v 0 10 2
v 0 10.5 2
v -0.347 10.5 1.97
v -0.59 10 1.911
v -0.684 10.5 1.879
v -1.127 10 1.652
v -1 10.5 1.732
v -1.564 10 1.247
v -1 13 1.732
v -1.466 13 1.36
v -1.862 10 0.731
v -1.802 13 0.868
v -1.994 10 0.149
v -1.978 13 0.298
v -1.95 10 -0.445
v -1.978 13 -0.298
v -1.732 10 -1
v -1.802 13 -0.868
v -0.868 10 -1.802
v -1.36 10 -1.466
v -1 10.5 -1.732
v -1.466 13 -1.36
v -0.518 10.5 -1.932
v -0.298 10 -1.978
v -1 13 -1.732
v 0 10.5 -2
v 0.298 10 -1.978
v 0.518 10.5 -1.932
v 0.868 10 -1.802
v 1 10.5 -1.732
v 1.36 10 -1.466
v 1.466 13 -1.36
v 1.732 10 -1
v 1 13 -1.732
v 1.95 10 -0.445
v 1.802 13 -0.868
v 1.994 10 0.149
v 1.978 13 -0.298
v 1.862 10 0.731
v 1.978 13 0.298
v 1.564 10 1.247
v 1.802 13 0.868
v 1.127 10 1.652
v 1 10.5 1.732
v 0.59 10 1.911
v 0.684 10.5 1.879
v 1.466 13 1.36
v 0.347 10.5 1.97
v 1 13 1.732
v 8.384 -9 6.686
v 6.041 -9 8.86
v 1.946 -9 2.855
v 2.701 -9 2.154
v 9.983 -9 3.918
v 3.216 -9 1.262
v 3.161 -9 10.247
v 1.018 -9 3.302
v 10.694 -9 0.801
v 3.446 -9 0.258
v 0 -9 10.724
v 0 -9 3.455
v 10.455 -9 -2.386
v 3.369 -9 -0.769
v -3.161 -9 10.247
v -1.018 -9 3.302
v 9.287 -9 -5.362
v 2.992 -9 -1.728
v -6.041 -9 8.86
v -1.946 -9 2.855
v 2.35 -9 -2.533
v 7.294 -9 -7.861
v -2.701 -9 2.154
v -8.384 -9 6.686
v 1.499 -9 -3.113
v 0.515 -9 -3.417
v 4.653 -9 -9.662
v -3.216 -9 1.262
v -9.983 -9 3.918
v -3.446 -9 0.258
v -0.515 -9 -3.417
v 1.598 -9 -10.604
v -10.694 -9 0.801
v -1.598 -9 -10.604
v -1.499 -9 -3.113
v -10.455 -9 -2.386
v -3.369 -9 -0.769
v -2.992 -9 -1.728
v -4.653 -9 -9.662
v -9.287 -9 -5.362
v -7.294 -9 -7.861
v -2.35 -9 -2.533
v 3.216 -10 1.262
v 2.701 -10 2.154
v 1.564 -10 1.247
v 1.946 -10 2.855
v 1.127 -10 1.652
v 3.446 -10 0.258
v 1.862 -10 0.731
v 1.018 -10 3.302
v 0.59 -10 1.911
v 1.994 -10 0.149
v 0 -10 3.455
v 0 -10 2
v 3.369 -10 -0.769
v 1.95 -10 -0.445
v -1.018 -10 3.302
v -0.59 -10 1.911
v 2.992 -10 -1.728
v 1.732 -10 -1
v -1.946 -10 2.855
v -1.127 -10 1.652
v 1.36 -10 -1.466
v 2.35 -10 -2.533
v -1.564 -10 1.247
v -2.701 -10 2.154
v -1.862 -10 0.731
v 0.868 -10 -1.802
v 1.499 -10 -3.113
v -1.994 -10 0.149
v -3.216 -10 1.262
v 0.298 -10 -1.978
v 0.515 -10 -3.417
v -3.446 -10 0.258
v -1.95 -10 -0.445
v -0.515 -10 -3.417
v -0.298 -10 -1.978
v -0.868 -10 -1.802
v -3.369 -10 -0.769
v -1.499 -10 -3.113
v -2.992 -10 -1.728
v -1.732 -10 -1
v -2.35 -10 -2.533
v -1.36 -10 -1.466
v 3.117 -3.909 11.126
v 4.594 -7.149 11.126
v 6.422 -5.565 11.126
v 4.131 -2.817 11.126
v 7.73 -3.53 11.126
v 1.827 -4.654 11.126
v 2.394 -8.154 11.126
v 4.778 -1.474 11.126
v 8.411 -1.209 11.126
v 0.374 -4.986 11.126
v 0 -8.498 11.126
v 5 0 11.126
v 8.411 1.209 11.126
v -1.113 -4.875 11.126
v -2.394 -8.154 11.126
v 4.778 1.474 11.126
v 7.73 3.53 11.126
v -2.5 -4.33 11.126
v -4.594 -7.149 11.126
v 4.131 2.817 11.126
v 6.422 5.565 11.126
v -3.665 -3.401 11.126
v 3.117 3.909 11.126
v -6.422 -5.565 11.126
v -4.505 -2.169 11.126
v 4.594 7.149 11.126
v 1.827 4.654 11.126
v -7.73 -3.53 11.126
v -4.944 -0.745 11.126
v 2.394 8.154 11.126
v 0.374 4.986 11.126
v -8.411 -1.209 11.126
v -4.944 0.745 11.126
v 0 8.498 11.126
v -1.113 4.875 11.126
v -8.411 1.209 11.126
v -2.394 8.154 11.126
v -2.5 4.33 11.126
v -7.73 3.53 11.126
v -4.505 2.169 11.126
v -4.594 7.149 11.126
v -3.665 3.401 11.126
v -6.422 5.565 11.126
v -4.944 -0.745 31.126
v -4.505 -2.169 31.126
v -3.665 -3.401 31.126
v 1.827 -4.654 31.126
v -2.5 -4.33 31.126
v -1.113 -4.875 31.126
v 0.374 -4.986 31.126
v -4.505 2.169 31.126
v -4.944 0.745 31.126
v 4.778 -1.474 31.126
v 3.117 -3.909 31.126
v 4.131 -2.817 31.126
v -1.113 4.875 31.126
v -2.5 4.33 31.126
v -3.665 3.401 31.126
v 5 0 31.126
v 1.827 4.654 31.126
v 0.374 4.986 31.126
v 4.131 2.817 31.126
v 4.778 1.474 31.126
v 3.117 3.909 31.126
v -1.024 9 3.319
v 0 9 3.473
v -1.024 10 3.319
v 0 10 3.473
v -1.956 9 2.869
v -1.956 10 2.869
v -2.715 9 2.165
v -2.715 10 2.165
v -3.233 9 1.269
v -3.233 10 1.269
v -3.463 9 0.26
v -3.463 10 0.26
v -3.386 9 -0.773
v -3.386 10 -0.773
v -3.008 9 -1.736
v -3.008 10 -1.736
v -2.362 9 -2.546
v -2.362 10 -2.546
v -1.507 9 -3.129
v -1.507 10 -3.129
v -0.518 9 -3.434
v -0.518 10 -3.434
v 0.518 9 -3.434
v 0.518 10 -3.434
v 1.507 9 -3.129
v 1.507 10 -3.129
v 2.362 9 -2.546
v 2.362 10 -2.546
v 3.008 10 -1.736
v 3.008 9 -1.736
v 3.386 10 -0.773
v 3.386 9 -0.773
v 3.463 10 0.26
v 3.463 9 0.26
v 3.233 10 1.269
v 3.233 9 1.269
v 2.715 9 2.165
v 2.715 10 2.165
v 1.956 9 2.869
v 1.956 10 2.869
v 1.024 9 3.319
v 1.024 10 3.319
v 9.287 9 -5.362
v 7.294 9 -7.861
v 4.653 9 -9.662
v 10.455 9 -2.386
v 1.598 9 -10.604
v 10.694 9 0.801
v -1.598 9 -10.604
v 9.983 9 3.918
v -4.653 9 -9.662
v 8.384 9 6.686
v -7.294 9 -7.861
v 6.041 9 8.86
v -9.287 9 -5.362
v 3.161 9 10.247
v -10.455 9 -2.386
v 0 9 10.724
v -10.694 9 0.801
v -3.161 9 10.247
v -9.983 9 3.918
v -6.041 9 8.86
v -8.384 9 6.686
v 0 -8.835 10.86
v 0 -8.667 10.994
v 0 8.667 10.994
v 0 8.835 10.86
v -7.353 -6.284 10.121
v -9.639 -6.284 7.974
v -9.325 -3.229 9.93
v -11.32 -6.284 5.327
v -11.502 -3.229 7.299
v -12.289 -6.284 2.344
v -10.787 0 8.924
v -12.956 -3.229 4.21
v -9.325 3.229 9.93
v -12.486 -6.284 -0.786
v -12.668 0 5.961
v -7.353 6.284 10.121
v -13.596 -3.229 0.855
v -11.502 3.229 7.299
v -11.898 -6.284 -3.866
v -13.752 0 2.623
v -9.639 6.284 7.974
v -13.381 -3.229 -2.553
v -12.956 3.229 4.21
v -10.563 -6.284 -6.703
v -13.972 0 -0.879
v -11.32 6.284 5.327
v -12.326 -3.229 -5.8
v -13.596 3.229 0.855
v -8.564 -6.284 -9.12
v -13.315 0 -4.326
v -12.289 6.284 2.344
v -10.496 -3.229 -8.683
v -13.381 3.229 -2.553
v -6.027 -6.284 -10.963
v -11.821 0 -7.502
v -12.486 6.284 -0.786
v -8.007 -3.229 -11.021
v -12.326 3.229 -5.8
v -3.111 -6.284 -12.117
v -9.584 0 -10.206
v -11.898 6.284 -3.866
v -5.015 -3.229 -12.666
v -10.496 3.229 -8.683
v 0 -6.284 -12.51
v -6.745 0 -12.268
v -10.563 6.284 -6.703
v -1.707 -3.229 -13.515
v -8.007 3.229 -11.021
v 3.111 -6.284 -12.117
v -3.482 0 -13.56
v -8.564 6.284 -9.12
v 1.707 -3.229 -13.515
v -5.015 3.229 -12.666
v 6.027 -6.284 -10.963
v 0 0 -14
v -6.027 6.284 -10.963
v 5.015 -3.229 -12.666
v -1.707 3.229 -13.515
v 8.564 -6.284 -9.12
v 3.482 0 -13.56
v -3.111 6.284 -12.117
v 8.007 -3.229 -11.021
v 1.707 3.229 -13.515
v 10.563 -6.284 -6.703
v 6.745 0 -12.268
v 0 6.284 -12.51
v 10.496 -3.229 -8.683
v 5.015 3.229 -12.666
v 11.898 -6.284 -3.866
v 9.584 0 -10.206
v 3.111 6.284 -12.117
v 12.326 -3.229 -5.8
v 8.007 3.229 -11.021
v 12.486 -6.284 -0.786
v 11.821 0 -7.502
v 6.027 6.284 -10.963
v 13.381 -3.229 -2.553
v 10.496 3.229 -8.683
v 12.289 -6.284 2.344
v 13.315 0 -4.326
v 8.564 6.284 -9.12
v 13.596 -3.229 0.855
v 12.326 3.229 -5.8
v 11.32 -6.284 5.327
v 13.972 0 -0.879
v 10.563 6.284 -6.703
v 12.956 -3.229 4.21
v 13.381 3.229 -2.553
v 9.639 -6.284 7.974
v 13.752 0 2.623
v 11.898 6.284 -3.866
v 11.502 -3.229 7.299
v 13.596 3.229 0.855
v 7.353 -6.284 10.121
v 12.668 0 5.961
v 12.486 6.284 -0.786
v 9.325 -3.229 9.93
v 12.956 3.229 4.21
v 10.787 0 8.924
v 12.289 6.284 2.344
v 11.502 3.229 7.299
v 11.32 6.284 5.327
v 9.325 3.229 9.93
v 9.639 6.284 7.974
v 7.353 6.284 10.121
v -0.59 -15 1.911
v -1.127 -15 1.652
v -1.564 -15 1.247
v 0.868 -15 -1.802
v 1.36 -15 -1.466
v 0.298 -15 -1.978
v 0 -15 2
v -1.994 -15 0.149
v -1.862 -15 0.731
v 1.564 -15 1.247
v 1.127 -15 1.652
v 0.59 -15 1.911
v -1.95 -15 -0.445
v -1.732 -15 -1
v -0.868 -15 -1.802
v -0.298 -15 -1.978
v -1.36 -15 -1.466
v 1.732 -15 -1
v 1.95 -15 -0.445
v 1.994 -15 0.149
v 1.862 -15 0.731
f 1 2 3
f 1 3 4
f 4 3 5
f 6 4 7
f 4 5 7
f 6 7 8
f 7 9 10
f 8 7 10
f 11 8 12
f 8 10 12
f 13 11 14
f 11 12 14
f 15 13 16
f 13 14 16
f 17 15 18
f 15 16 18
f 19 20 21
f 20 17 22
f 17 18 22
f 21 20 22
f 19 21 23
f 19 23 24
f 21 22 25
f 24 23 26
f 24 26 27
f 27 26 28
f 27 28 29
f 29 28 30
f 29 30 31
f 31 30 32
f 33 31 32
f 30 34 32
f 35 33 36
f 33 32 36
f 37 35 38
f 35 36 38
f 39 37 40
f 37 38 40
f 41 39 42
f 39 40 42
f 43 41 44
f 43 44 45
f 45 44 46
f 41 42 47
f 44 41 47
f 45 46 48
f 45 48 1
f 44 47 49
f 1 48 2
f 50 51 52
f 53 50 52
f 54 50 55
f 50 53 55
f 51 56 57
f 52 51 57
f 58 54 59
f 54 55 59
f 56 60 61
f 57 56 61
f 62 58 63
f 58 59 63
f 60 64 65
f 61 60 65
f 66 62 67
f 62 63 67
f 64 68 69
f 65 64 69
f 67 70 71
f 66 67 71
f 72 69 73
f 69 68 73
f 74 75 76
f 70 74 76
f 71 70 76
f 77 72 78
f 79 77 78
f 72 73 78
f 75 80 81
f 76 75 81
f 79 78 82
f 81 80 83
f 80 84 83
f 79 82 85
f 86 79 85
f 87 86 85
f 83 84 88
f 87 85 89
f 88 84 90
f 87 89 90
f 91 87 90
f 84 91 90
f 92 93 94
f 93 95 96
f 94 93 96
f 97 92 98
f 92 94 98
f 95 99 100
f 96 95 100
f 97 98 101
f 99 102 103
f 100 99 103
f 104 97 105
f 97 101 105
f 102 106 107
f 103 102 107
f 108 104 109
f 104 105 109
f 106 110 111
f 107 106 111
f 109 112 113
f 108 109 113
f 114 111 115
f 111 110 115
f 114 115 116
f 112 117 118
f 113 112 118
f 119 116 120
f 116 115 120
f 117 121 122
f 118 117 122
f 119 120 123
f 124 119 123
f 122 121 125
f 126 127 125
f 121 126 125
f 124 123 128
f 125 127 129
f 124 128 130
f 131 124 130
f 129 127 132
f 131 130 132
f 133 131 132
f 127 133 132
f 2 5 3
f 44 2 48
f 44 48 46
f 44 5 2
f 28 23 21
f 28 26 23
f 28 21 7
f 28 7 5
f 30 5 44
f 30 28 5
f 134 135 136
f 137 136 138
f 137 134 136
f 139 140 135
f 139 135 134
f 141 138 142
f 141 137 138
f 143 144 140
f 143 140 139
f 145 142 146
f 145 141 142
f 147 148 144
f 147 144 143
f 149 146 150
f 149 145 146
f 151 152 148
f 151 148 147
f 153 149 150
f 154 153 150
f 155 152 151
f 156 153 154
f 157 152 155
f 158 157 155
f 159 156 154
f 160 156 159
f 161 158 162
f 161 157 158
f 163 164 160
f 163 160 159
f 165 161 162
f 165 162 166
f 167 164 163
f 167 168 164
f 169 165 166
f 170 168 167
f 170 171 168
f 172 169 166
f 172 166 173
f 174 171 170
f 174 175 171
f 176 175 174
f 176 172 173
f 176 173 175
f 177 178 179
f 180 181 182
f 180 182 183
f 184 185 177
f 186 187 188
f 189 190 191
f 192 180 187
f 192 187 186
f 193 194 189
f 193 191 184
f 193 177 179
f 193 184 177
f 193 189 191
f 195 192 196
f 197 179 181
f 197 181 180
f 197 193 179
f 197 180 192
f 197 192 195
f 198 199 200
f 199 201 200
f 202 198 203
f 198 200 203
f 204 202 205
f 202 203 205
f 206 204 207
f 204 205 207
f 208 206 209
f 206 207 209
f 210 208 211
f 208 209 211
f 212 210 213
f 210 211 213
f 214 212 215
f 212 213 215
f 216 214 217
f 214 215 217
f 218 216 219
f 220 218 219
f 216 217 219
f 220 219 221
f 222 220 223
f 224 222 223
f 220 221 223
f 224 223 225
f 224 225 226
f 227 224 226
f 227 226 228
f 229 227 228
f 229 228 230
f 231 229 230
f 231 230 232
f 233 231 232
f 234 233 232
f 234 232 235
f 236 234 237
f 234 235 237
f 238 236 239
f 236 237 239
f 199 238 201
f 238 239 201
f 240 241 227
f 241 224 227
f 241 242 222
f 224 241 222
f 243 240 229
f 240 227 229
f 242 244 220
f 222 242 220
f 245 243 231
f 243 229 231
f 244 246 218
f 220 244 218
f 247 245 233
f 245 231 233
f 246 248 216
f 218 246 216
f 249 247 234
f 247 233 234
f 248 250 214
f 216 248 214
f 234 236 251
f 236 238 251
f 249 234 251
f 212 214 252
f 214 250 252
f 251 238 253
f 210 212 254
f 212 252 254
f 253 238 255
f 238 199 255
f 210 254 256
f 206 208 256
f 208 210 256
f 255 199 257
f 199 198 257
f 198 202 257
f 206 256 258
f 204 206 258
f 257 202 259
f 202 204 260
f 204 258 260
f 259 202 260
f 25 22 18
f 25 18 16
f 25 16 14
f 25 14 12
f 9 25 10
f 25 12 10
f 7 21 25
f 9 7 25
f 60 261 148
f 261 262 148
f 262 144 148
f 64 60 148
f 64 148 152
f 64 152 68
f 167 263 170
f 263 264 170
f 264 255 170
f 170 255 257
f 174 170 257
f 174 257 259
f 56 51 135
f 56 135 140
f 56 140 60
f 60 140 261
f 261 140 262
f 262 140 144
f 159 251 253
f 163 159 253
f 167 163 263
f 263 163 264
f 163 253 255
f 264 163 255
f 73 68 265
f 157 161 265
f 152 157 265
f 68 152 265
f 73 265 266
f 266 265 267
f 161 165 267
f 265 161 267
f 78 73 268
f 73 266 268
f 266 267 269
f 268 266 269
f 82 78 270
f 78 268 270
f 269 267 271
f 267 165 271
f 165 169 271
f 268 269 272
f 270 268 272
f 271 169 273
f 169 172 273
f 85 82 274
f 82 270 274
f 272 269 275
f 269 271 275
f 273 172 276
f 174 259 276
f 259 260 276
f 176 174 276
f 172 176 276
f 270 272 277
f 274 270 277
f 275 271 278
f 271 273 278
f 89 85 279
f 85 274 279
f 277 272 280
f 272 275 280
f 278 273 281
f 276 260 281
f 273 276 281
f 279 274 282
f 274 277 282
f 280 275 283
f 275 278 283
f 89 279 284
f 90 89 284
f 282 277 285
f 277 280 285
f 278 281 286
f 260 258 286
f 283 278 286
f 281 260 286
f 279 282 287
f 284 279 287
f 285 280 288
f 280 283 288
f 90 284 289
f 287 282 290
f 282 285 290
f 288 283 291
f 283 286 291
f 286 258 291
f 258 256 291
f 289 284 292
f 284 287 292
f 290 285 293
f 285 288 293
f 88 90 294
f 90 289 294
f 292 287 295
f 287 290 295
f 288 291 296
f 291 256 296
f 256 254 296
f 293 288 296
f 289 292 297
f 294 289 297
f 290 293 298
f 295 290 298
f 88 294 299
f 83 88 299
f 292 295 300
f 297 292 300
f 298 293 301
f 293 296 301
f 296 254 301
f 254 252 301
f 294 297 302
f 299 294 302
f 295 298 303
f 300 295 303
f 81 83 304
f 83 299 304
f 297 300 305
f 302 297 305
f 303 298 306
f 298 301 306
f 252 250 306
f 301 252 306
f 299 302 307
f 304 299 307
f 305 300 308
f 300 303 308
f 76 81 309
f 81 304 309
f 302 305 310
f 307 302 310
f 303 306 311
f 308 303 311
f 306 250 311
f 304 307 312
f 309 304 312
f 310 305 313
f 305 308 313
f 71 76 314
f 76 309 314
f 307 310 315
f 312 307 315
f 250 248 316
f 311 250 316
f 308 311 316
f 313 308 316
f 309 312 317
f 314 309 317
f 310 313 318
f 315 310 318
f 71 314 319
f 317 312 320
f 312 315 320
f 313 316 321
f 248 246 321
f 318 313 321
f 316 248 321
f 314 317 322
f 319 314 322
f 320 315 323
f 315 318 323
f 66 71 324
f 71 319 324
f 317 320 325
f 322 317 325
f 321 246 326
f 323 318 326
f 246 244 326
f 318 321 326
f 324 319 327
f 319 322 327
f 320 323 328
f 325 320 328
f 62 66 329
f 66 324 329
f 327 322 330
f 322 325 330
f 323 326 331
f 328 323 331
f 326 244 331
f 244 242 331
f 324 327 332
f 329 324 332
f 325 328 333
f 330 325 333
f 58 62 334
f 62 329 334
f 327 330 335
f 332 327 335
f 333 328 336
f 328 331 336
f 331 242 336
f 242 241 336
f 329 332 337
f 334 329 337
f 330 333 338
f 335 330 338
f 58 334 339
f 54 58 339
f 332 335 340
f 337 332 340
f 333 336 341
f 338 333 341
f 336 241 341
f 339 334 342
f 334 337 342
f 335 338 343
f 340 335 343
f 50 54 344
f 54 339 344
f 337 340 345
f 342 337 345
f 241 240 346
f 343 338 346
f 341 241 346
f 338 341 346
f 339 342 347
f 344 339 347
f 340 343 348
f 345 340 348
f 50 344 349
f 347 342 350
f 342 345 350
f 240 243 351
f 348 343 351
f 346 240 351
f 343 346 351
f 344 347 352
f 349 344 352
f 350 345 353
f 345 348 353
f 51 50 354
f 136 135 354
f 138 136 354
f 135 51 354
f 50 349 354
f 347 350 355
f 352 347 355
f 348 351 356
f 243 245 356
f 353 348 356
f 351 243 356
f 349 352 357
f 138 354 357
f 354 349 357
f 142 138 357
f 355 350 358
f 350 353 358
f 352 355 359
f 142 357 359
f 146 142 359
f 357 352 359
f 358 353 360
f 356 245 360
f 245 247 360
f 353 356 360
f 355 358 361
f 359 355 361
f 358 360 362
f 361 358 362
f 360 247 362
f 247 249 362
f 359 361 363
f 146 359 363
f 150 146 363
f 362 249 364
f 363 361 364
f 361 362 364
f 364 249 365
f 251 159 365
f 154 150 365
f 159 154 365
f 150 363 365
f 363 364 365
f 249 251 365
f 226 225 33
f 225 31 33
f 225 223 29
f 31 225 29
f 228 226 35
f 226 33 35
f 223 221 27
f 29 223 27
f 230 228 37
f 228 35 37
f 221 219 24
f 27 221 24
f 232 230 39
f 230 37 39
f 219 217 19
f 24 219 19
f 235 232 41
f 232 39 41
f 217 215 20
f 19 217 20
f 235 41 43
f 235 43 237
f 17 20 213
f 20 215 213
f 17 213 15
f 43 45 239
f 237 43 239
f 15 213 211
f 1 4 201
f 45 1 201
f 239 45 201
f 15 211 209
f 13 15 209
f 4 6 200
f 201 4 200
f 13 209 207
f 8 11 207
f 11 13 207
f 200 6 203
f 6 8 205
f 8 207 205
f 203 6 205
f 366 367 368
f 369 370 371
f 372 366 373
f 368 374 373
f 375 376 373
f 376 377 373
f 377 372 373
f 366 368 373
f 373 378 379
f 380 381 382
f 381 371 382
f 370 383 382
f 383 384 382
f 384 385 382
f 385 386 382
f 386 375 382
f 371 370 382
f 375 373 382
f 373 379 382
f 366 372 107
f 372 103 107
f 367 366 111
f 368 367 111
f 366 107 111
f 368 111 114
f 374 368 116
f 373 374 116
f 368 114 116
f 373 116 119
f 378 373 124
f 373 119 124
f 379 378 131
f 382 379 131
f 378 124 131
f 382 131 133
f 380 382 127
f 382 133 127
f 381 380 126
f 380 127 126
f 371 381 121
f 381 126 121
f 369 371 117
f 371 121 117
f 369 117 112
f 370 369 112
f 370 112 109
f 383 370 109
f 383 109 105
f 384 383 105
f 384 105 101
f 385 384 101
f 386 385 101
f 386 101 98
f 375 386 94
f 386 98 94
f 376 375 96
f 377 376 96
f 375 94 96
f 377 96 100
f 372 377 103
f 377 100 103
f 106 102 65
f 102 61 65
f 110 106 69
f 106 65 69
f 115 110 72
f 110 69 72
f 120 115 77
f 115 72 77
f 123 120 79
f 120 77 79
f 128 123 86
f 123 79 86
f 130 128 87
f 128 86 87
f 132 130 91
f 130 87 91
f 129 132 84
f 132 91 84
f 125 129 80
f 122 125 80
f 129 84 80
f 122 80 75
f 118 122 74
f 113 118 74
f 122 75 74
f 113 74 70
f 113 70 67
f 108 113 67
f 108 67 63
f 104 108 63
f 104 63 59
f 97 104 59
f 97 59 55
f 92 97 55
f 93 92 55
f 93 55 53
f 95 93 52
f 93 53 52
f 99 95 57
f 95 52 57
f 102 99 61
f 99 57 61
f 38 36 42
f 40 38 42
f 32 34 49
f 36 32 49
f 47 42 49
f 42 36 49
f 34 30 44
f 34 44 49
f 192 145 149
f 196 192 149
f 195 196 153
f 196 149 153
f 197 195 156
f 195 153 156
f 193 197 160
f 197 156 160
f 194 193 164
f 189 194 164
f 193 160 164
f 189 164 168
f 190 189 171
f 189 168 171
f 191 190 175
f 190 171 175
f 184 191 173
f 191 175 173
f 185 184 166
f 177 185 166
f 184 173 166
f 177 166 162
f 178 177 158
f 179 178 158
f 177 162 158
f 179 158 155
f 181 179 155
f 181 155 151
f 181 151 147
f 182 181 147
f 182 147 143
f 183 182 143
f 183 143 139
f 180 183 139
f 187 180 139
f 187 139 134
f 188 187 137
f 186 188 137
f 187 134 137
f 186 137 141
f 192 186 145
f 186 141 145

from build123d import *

# Parameters (mm, degrees)
CORTAR_EXTRUIR1_DEPTH      = 15
CORTAR_EXTRUIR1_DEPTH_BACK = 10
CROQUIS2_W                 = 7.74823864
CROQUIS2_H                 = 16.99585586
CROQUIS4_R                 = 5
SALIENTE_EXTRUIR2_DEPTH    = 20
CORTAR_EXTRUIR2_DEPTH      = 2
CORTAR_EXTRUIR2_DEPTH_BACK = 2
CROQUIS6_W                 = 2
CROQUIS6_H                 = 2.5


with BuildPart() as part:
    # Croquis1 → Revolución2 (revolve)
    with BuildSketch(Plane.XY, mode=Mode.PRIVATE) as revoluci_n2_sk:
        with BuildLine():
            Line((0, 9), (0, -11))
            Line((0, -11), (0, -12))
            Line((0, -12), (0, -15))
            Line((0, -15), (2, -15))
            Line((2, -15), (2, -10))
            Line((2, -10), (3.455214016, -10))
            Line((3.455214016, -10), (3.455214016, -9))
            Line((3.455214016, -9), (10.723805295, -9))
            ThreePointArc((10.723805295, -9), (14, 0), (10.723805295, 9))
            Line((10.723805295, 9), (3.47289893, 9))
            Line((3.47289893, 9), (3.47289893, 10))
            Line((3.47289893, 10), (2, 10))
            Line((2, 10), (2, 13))
            Line((2, 13), (0, 13))
            Line((0, 13), (0, 10))
            Line((0, 10), (0, 9))
        make_face()
    revolve(revoluci_n2_sk.sketch.rotate(Axis((0, 9, 0), (0, -1, 0)), 90), axis=Axis((0, 9, 0), (0, -1, 0)))

    # Croquis2 → Cortar-Extruir1 (cut, two sides: drawn at the far end of the back side and taken through both)
    with BuildSketch(Plane(origin=(0, 0, 0), x_dir=(0, 0, -1), z_dir=(1, 0, 0)).offset(-CORTAR_EXTRUIR1_DEPTH_BACK)):
        with Locations((-15, 0)):
            Rectangle(CROQUIS2_W, CROQUIS2_H)
    extrude(amount=CORTAR_EXTRUIR1_DEPTH + CORTAR_EXTRUIR1_DEPTH_BACK, mode=Mode.SUBTRACT)

    # Croquis4 → Saliente-Extruir2 (add)
    with BuildSketch(Plane.XY.offset(11.12588068)):
        Circle(CROQUIS4_R)
    extrude(amount=SALIENTE_EXTRUIR2_DEPTH)

    # Croquis6 → Cortar-Extruir2 (cut, two sides: drawn at the far end of the back side and taken through both)
    with BuildSketch(Plane.XY.offset(-CORTAR_EXTRUIR2_DEPTH_BACK)):
        with Locations((0, 11.75)):
            Rectangle(CROQUIS6_W, CROQUIS6_H)
    extrude(amount=CORTAR_EXTRUIR2_DEPTH + CORTAR_EXTRUIR2_DEPTH_BACK, mode=Mode.SUBTRACT)


solid = part.part
